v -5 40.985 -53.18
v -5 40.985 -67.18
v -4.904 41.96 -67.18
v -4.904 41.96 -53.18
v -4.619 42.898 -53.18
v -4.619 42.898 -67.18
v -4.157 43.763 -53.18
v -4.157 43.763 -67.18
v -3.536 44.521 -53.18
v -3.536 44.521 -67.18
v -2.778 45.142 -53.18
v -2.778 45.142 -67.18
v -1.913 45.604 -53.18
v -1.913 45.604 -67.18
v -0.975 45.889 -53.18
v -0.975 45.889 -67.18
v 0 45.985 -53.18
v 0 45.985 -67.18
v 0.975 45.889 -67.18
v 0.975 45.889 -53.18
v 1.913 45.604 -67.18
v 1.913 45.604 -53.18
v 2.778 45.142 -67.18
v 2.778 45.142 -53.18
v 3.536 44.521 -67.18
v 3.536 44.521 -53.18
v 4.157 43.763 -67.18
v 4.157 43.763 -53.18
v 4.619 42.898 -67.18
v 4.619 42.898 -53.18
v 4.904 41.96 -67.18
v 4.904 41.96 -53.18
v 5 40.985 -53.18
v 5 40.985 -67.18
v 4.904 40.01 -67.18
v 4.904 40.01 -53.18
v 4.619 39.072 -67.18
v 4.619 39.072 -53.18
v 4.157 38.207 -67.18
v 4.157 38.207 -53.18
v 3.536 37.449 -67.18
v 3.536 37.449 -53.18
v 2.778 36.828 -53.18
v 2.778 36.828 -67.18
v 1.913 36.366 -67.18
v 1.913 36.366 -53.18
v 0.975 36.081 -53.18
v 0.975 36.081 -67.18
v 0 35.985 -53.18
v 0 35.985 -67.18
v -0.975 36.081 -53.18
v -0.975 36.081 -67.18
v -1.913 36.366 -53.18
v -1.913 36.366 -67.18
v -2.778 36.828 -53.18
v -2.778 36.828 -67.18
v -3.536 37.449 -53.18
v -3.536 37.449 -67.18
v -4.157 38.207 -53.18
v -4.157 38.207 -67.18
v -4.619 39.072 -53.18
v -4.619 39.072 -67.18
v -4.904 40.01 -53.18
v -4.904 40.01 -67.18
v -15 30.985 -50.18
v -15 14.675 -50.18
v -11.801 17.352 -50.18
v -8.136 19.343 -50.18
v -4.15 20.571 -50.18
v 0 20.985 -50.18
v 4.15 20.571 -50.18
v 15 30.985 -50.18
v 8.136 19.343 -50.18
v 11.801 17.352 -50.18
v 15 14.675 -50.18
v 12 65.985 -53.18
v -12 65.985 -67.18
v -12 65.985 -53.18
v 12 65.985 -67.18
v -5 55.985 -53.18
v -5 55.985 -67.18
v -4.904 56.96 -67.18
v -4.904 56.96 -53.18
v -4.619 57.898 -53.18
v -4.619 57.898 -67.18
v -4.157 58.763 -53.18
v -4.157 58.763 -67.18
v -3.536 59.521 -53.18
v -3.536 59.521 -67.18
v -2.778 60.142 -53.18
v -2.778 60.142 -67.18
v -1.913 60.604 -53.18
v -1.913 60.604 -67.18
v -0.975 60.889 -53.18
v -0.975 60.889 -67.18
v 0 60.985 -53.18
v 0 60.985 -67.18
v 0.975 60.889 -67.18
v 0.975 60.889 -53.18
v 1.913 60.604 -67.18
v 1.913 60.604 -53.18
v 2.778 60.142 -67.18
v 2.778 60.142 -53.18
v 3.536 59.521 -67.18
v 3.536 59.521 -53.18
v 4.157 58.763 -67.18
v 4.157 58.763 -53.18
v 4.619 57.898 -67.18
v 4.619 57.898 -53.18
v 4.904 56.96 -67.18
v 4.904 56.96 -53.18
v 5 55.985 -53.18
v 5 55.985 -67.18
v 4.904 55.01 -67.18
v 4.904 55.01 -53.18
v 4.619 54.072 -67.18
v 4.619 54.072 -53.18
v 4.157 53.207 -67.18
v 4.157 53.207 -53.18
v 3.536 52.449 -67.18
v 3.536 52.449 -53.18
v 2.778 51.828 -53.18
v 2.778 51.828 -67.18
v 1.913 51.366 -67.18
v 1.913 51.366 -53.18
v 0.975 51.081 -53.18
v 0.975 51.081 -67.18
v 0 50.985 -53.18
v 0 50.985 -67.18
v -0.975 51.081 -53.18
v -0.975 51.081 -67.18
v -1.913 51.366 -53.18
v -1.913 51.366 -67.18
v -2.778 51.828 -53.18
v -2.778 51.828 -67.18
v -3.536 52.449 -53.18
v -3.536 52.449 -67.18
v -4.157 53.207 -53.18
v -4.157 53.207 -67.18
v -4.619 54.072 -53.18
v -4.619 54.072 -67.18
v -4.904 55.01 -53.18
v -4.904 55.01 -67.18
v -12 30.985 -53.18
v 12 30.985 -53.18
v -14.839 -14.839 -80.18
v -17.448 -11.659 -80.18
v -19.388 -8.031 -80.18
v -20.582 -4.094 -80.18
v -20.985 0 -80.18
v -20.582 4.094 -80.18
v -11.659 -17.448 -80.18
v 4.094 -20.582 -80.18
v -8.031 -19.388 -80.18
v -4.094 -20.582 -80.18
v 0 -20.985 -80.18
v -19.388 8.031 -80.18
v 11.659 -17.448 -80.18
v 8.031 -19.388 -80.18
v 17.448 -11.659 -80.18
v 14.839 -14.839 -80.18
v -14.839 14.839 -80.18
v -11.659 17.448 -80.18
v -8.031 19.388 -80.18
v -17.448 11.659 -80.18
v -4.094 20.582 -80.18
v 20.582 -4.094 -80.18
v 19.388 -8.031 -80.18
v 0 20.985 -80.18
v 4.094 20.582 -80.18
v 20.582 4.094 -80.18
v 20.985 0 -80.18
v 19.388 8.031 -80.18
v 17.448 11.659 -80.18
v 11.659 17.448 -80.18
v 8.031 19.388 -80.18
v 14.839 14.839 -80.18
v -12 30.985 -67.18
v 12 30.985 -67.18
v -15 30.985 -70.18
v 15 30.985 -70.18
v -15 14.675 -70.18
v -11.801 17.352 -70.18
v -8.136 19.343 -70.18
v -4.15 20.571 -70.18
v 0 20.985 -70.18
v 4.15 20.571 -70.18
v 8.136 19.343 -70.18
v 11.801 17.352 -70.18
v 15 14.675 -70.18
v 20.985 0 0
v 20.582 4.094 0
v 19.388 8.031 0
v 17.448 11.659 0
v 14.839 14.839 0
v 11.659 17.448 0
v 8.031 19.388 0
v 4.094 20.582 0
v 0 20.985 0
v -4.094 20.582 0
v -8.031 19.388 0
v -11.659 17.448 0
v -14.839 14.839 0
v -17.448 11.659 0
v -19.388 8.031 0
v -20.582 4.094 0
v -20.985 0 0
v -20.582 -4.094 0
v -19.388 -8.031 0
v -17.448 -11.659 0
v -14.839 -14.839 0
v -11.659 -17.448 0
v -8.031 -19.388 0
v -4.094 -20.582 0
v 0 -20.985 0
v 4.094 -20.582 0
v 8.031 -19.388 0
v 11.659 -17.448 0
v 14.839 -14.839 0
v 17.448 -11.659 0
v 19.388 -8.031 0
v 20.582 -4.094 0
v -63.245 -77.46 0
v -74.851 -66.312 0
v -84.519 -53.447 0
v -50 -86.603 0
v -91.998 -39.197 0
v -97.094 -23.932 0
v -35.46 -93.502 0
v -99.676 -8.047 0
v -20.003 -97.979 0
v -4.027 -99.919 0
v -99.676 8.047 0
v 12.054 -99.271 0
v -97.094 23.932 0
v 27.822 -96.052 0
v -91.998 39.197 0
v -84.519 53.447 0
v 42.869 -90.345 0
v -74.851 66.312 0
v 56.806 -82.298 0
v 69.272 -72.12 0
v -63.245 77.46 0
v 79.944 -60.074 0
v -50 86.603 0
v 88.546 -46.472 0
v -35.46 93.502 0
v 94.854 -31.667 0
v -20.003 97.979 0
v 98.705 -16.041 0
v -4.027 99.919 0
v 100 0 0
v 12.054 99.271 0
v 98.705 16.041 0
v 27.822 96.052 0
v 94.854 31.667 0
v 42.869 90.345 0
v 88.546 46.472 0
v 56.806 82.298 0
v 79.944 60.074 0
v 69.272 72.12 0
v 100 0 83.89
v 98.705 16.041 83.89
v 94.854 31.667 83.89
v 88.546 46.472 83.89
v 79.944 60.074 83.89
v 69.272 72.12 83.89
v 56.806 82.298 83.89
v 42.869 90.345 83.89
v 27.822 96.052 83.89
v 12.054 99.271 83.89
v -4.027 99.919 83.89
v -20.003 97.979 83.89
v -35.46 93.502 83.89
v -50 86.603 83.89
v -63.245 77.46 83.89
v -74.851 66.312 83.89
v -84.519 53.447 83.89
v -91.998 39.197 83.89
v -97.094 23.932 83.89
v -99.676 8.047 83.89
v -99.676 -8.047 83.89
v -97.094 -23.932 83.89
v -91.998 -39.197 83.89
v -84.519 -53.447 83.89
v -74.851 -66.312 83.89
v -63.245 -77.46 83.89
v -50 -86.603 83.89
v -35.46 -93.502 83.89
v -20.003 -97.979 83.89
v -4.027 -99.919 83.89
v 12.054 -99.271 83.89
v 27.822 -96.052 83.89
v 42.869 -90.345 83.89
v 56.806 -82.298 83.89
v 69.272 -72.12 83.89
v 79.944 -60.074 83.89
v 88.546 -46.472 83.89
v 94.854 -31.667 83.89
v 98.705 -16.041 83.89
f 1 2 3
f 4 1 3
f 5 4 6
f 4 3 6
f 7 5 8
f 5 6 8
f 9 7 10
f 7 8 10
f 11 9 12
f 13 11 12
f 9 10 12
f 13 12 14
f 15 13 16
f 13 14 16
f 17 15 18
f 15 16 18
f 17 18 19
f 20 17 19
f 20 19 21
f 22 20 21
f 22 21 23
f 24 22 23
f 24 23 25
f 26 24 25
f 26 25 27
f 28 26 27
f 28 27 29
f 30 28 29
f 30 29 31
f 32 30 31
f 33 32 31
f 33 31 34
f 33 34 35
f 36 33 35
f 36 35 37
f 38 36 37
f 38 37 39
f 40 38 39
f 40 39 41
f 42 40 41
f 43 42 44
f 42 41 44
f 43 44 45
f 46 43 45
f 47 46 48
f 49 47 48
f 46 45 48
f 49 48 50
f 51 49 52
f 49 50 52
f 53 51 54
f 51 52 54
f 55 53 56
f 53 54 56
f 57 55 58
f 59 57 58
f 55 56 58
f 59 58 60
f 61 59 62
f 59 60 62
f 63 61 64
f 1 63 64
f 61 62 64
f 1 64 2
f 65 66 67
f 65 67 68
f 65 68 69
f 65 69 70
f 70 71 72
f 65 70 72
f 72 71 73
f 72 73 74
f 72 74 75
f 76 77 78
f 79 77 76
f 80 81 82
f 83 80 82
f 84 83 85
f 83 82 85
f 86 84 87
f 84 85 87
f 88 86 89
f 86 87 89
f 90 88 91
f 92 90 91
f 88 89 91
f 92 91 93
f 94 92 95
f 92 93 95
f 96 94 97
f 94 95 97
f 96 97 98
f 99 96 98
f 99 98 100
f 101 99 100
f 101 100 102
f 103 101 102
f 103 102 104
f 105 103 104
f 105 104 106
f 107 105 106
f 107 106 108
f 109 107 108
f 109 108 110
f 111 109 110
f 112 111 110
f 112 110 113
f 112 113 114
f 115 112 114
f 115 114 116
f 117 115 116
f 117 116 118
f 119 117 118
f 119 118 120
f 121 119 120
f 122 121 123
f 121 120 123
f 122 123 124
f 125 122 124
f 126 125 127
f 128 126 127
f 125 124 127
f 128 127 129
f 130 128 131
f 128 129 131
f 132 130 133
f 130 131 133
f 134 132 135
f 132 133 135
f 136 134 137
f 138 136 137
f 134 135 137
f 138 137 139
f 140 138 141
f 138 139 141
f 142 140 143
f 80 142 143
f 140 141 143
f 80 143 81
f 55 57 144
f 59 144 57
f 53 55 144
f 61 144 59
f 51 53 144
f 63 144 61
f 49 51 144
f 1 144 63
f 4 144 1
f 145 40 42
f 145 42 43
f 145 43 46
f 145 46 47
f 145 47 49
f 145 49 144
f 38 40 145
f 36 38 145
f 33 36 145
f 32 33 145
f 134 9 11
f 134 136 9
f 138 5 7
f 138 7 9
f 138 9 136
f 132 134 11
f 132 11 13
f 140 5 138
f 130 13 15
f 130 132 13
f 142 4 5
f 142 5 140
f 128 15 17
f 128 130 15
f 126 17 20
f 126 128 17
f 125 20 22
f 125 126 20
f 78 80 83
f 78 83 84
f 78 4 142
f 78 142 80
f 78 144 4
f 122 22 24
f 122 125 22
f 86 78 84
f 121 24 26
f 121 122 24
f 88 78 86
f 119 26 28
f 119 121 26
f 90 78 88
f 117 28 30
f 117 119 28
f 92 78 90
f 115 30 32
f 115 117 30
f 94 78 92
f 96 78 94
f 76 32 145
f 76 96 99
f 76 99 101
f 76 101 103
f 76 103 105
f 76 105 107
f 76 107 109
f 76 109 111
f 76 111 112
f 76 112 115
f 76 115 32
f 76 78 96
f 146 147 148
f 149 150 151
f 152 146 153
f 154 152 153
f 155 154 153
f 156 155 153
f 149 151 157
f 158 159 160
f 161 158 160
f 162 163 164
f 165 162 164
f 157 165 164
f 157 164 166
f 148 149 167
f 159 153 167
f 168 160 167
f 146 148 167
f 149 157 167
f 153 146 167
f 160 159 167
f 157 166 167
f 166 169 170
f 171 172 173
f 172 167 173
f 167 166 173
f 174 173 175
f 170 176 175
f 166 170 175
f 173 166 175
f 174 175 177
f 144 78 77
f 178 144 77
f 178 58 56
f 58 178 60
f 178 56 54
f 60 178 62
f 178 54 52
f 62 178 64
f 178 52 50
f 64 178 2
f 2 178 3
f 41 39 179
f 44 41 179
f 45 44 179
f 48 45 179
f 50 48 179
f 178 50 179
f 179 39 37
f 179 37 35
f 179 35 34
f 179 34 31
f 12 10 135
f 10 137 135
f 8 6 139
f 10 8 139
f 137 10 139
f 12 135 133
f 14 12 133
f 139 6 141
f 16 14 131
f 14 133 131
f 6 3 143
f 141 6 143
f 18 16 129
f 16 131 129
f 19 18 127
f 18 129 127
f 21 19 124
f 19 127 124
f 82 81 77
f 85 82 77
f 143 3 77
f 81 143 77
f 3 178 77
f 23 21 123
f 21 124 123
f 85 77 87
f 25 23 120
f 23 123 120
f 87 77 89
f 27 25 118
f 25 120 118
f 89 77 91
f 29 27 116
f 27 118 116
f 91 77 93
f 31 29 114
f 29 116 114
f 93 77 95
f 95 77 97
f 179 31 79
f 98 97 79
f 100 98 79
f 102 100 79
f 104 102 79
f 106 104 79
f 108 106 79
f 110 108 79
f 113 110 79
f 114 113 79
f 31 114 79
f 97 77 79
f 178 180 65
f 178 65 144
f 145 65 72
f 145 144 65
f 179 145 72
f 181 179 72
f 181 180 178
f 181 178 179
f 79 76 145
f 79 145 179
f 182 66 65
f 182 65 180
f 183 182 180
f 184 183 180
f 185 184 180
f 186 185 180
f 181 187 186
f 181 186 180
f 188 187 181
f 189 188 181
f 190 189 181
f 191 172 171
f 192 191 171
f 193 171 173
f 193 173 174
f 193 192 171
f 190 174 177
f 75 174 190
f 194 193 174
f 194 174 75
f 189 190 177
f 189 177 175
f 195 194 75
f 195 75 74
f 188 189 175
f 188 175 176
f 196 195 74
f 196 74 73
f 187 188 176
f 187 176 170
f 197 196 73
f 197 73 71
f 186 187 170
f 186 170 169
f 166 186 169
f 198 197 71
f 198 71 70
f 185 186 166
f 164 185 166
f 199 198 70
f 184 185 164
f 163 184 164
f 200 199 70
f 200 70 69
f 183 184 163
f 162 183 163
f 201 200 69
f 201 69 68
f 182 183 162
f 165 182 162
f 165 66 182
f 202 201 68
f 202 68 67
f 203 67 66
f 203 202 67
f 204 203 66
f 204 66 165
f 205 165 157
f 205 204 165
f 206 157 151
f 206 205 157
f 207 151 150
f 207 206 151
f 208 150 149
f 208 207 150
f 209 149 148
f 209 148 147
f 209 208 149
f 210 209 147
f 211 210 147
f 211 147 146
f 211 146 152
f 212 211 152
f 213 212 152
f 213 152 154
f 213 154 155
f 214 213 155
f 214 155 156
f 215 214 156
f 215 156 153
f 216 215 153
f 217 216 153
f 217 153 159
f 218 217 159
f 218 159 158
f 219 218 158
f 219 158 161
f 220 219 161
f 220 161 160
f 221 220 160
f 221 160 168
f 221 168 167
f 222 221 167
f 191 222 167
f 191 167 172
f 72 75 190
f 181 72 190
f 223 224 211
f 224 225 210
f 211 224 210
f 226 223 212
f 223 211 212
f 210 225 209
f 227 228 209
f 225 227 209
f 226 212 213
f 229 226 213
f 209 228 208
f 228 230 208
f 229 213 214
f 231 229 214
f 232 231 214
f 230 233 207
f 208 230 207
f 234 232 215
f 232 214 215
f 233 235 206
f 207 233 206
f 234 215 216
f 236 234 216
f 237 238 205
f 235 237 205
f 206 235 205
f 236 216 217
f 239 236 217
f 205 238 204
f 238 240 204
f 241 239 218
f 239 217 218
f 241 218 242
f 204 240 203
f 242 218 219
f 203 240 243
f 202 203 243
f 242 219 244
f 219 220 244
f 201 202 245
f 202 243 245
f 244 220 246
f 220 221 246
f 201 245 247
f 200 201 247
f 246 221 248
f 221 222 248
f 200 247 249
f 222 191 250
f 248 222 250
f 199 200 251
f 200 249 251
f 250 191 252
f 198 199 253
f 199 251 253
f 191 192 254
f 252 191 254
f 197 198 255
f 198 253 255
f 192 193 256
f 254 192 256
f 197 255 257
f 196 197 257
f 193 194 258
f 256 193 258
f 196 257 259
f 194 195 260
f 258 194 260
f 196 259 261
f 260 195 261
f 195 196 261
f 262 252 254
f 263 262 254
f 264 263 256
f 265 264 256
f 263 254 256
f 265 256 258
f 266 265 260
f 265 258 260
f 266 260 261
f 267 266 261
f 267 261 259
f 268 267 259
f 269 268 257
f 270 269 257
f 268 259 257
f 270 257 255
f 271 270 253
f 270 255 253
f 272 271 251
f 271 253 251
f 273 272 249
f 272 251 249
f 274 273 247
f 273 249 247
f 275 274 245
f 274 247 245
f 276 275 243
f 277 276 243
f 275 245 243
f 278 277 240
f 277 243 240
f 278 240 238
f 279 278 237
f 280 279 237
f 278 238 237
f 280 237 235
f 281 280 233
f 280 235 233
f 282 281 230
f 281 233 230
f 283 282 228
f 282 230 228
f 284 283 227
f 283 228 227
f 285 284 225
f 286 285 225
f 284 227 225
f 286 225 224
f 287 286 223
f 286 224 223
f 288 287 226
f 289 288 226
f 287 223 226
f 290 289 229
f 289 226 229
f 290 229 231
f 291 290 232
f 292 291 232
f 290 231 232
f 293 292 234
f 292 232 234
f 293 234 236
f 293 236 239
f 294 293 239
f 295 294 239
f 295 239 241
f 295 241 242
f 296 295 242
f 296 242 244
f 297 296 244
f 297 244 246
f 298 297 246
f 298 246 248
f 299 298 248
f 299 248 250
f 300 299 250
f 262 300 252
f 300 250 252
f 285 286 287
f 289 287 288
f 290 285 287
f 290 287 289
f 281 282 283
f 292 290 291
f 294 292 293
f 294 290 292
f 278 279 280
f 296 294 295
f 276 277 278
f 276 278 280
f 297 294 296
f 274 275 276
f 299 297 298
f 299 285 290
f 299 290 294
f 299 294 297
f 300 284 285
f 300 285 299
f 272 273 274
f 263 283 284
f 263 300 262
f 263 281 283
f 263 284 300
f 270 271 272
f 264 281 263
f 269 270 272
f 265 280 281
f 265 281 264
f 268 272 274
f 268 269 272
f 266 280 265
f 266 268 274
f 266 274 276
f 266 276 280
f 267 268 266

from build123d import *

# Parameters (mm, degrees)
SKETCH1_R          = 100
BODY_DEPTH         = 83.89
SKETCH2_R          = 20.985
SHAFT_DEPTH        = 80.18
MOUNT_START        = -6.309503
SKETCH5_W          = 30
SKETCH5_H          = 20
MOUNT_BASE_DEPTH   = 51.309503
SKETCH6_W          = 30
SKETCH6_H          = 20
SKETCH6_W_2        = 24
SKETCH6_H_2        = 14
MOUNT_TONGUE_DEPTH = 35
MOUNT_HOLES_REACH  = 208.935
SKETCH7_R          = 5


with BuildPart() as part:
    # Sketch1 → Body (new body)
    with BuildSketch(Plane.XY):
        Circle(SKETCH1_R)
    extrude(amount=BODY_DEPTH)

    # Sketch2 → Shaft (add)
    with BuildSketch(Plane.XY):
        Circle(SKETCH2_R)
    extrude(amount=-SHAFT_DEPTH)

    # Sketch5 → Mount Base (add)
    with BuildSketch(Plane(origin=(0, 20.985, 0), x_dir=(1, 0, 0), z_dir=(0, 1, 0)).offset(MOUNT_START)):
        with Locations((0, 60.18)):
            Rectangle(SKETCH5_W, SKETCH5_H)
    extrude(amount=MOUNT_BASE_DEPTH)

    # Sketch6 → Mount Tongue (cut)
    with BuildSketch(Plane(origin=(0, 65.985, 0), x_dir=(1, 0, 0), z_dir=(0, 1, 0))):
        with Locations((0, 60.18)):
            Rectangle(SKETCH6_W, SKETCH6_H)
        with Locations((0, 60.18)):
            Rectangle(SKETCH6_W_2, SKETCH6_H_2, mode=Mode.SUBTRACT)
    extrude(amount=-MOUNT_TONGUE_DEPTH, mode=Mode.SUBTRACT)

    # Sketch7 → Mount Holes (cut, up to next)
    with BuildSketch(Plane(origin=(0, 0, -67.18), x_dir=(-1, 0, 0), z_dir=(0, 0, -1)), mode=Mode.PRIVATE) as mount_holes_sk1:
        with Locations((0, 40.985)):
            Circle(SKETCH7_R)
    mount_holes_tool1 = extrude(mount_holes_sk1.sketch, amount=-MOUNT_HOLES_REACH, mode=Mode.PRIVATE) & part.part
    # Sketch7 → Mount Holes (cut, up to next)
    with BuildSketch(Plane(origin=(0, 0, -67.18), x_dir=(-1, 0, 0), z_dir=(0, 0, -1)), mode=Mode.PRIVATE) as mount_holes_sk2:
        with Locations((0, 55.985)):
            Circle(SKETCH7_R)
    mount_holes_tool2 = extrude(mount_holes_sk2.sketch, amount=-MOUNT_HOLES_REACH, mode=Mode.PRIVATE) & part.part
    add(mount_holes_tool1.solids().sort_by_distance((0, 40.985, -67.18))[0], mode=Mode.SUBTRACT)
    add(mount_holes_tool2.solids().sort_by_distance((0, 55.985, -67.18))[0], mode=Mode.SUBTRACT)


solid = part.part
